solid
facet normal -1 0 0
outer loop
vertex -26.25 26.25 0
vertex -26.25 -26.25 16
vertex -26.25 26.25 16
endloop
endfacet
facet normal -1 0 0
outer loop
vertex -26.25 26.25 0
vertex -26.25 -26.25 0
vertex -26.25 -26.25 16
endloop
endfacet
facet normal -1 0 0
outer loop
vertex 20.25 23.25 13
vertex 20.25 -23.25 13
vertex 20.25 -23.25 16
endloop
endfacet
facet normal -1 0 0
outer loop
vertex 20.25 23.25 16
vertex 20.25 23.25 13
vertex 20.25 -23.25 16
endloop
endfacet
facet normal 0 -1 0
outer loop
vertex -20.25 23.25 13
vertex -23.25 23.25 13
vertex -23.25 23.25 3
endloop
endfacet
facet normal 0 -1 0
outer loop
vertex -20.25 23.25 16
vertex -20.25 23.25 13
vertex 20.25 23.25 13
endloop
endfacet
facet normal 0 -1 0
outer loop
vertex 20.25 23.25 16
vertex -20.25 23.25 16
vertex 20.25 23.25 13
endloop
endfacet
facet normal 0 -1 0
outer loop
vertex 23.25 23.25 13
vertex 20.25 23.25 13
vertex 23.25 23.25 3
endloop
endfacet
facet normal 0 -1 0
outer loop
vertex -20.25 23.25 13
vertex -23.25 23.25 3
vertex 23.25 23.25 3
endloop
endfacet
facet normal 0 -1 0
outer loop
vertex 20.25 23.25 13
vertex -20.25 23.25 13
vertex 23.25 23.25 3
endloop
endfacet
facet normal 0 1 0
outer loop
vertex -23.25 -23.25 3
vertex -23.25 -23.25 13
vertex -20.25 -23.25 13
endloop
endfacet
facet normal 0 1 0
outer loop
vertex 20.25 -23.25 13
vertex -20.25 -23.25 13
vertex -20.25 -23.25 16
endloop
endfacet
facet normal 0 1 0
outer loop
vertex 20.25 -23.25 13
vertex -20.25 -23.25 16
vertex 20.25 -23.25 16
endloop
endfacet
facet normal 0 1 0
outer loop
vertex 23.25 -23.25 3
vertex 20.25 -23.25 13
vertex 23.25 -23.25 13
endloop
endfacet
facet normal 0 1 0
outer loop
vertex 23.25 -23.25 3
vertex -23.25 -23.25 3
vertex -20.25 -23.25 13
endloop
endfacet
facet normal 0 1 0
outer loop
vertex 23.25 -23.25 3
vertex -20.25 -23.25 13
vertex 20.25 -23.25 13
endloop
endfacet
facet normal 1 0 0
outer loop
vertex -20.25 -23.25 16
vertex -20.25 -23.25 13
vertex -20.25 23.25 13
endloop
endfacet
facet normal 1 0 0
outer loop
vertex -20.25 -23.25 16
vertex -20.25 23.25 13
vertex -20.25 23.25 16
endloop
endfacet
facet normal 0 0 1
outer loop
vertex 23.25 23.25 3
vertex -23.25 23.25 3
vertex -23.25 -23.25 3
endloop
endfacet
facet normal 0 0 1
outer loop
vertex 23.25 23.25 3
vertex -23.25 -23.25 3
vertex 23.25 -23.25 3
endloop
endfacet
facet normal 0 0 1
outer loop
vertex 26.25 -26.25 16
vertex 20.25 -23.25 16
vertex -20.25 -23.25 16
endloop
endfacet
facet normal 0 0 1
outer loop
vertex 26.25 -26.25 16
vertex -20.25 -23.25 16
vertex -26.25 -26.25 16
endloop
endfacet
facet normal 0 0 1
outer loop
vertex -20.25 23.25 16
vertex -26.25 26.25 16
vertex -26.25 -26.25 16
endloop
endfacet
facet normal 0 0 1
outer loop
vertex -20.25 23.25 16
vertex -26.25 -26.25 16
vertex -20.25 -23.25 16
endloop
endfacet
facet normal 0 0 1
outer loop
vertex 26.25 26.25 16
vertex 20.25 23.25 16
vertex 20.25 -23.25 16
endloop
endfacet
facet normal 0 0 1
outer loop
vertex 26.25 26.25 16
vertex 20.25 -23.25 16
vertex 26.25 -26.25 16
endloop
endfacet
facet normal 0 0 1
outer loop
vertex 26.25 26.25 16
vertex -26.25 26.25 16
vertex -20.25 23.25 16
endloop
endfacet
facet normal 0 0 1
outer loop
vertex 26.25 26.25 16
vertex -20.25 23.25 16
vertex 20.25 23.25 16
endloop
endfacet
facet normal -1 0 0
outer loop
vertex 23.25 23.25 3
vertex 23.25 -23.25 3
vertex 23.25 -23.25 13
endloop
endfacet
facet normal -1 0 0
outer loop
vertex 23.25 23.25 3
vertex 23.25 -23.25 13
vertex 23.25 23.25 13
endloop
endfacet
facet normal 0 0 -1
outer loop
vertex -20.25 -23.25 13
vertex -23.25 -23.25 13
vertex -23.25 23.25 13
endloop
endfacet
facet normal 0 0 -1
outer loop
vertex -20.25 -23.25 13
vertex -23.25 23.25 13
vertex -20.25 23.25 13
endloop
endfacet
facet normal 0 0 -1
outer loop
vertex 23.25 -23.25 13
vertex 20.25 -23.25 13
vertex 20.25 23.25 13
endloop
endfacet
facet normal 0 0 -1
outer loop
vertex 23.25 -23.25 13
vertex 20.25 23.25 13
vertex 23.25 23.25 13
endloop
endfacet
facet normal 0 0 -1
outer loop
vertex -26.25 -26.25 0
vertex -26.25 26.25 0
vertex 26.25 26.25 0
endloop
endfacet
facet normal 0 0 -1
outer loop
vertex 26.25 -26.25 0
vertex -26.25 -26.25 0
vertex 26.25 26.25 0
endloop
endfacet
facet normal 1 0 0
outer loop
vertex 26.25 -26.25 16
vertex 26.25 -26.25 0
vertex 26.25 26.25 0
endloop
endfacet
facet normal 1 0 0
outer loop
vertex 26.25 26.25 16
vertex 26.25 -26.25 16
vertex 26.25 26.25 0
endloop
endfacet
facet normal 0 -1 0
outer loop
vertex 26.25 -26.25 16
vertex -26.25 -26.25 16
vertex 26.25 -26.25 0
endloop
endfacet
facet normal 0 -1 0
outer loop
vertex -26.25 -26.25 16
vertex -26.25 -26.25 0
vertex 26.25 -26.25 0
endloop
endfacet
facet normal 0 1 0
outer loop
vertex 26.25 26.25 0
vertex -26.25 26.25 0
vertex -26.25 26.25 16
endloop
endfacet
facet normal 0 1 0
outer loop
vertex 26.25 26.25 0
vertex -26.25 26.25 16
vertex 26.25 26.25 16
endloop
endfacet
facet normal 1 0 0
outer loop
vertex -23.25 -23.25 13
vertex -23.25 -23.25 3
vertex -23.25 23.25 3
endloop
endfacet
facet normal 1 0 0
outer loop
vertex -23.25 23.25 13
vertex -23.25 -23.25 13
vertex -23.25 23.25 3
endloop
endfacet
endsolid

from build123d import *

# Parameters (mm, degrees)
F0_W     = 52.5
F0_H     = 52.5
F1_DEPTH = 3
F2_W     = 52.5
F2_H     = 52.5
F2_W_2   = 46.5
F2_H_2   = 46.5
F3_DEPTH = 13
F4_W     = 6
F4_H     = 3
F5_DEPTH = 52.5


with BuildPart() as f1:
    # F0 (on Top) → F1 (new body)
    with BuildSketch(Plane.XY):
        Rectangle(F0_W, F0_H)
    extrude(amount=F1_DEPTH)

    # F2 (on face) → F3 (join)
    with BuildSketch(Plane.XY.offset(3)):
        Rectangle(F2_W, F2_H)
        Rectangle(F2_W_2, F2_H_2, mode=Mode.SUBTRACT)
    extrude(amount=F3_DEPTH)

    # F4 (on face) → F5 (join)
    with BuildSketch(Plane.XZ.offset(26.25)):
        with Locations((-23.25, 14.5)):
            Rectangle(F4_W, F4_H)
        with Locations((23.25, 14.5)):
            Rectangle(F4_W, F4_H)
    extrude(amount=-F5_DEPTH)


solid = f1.part
